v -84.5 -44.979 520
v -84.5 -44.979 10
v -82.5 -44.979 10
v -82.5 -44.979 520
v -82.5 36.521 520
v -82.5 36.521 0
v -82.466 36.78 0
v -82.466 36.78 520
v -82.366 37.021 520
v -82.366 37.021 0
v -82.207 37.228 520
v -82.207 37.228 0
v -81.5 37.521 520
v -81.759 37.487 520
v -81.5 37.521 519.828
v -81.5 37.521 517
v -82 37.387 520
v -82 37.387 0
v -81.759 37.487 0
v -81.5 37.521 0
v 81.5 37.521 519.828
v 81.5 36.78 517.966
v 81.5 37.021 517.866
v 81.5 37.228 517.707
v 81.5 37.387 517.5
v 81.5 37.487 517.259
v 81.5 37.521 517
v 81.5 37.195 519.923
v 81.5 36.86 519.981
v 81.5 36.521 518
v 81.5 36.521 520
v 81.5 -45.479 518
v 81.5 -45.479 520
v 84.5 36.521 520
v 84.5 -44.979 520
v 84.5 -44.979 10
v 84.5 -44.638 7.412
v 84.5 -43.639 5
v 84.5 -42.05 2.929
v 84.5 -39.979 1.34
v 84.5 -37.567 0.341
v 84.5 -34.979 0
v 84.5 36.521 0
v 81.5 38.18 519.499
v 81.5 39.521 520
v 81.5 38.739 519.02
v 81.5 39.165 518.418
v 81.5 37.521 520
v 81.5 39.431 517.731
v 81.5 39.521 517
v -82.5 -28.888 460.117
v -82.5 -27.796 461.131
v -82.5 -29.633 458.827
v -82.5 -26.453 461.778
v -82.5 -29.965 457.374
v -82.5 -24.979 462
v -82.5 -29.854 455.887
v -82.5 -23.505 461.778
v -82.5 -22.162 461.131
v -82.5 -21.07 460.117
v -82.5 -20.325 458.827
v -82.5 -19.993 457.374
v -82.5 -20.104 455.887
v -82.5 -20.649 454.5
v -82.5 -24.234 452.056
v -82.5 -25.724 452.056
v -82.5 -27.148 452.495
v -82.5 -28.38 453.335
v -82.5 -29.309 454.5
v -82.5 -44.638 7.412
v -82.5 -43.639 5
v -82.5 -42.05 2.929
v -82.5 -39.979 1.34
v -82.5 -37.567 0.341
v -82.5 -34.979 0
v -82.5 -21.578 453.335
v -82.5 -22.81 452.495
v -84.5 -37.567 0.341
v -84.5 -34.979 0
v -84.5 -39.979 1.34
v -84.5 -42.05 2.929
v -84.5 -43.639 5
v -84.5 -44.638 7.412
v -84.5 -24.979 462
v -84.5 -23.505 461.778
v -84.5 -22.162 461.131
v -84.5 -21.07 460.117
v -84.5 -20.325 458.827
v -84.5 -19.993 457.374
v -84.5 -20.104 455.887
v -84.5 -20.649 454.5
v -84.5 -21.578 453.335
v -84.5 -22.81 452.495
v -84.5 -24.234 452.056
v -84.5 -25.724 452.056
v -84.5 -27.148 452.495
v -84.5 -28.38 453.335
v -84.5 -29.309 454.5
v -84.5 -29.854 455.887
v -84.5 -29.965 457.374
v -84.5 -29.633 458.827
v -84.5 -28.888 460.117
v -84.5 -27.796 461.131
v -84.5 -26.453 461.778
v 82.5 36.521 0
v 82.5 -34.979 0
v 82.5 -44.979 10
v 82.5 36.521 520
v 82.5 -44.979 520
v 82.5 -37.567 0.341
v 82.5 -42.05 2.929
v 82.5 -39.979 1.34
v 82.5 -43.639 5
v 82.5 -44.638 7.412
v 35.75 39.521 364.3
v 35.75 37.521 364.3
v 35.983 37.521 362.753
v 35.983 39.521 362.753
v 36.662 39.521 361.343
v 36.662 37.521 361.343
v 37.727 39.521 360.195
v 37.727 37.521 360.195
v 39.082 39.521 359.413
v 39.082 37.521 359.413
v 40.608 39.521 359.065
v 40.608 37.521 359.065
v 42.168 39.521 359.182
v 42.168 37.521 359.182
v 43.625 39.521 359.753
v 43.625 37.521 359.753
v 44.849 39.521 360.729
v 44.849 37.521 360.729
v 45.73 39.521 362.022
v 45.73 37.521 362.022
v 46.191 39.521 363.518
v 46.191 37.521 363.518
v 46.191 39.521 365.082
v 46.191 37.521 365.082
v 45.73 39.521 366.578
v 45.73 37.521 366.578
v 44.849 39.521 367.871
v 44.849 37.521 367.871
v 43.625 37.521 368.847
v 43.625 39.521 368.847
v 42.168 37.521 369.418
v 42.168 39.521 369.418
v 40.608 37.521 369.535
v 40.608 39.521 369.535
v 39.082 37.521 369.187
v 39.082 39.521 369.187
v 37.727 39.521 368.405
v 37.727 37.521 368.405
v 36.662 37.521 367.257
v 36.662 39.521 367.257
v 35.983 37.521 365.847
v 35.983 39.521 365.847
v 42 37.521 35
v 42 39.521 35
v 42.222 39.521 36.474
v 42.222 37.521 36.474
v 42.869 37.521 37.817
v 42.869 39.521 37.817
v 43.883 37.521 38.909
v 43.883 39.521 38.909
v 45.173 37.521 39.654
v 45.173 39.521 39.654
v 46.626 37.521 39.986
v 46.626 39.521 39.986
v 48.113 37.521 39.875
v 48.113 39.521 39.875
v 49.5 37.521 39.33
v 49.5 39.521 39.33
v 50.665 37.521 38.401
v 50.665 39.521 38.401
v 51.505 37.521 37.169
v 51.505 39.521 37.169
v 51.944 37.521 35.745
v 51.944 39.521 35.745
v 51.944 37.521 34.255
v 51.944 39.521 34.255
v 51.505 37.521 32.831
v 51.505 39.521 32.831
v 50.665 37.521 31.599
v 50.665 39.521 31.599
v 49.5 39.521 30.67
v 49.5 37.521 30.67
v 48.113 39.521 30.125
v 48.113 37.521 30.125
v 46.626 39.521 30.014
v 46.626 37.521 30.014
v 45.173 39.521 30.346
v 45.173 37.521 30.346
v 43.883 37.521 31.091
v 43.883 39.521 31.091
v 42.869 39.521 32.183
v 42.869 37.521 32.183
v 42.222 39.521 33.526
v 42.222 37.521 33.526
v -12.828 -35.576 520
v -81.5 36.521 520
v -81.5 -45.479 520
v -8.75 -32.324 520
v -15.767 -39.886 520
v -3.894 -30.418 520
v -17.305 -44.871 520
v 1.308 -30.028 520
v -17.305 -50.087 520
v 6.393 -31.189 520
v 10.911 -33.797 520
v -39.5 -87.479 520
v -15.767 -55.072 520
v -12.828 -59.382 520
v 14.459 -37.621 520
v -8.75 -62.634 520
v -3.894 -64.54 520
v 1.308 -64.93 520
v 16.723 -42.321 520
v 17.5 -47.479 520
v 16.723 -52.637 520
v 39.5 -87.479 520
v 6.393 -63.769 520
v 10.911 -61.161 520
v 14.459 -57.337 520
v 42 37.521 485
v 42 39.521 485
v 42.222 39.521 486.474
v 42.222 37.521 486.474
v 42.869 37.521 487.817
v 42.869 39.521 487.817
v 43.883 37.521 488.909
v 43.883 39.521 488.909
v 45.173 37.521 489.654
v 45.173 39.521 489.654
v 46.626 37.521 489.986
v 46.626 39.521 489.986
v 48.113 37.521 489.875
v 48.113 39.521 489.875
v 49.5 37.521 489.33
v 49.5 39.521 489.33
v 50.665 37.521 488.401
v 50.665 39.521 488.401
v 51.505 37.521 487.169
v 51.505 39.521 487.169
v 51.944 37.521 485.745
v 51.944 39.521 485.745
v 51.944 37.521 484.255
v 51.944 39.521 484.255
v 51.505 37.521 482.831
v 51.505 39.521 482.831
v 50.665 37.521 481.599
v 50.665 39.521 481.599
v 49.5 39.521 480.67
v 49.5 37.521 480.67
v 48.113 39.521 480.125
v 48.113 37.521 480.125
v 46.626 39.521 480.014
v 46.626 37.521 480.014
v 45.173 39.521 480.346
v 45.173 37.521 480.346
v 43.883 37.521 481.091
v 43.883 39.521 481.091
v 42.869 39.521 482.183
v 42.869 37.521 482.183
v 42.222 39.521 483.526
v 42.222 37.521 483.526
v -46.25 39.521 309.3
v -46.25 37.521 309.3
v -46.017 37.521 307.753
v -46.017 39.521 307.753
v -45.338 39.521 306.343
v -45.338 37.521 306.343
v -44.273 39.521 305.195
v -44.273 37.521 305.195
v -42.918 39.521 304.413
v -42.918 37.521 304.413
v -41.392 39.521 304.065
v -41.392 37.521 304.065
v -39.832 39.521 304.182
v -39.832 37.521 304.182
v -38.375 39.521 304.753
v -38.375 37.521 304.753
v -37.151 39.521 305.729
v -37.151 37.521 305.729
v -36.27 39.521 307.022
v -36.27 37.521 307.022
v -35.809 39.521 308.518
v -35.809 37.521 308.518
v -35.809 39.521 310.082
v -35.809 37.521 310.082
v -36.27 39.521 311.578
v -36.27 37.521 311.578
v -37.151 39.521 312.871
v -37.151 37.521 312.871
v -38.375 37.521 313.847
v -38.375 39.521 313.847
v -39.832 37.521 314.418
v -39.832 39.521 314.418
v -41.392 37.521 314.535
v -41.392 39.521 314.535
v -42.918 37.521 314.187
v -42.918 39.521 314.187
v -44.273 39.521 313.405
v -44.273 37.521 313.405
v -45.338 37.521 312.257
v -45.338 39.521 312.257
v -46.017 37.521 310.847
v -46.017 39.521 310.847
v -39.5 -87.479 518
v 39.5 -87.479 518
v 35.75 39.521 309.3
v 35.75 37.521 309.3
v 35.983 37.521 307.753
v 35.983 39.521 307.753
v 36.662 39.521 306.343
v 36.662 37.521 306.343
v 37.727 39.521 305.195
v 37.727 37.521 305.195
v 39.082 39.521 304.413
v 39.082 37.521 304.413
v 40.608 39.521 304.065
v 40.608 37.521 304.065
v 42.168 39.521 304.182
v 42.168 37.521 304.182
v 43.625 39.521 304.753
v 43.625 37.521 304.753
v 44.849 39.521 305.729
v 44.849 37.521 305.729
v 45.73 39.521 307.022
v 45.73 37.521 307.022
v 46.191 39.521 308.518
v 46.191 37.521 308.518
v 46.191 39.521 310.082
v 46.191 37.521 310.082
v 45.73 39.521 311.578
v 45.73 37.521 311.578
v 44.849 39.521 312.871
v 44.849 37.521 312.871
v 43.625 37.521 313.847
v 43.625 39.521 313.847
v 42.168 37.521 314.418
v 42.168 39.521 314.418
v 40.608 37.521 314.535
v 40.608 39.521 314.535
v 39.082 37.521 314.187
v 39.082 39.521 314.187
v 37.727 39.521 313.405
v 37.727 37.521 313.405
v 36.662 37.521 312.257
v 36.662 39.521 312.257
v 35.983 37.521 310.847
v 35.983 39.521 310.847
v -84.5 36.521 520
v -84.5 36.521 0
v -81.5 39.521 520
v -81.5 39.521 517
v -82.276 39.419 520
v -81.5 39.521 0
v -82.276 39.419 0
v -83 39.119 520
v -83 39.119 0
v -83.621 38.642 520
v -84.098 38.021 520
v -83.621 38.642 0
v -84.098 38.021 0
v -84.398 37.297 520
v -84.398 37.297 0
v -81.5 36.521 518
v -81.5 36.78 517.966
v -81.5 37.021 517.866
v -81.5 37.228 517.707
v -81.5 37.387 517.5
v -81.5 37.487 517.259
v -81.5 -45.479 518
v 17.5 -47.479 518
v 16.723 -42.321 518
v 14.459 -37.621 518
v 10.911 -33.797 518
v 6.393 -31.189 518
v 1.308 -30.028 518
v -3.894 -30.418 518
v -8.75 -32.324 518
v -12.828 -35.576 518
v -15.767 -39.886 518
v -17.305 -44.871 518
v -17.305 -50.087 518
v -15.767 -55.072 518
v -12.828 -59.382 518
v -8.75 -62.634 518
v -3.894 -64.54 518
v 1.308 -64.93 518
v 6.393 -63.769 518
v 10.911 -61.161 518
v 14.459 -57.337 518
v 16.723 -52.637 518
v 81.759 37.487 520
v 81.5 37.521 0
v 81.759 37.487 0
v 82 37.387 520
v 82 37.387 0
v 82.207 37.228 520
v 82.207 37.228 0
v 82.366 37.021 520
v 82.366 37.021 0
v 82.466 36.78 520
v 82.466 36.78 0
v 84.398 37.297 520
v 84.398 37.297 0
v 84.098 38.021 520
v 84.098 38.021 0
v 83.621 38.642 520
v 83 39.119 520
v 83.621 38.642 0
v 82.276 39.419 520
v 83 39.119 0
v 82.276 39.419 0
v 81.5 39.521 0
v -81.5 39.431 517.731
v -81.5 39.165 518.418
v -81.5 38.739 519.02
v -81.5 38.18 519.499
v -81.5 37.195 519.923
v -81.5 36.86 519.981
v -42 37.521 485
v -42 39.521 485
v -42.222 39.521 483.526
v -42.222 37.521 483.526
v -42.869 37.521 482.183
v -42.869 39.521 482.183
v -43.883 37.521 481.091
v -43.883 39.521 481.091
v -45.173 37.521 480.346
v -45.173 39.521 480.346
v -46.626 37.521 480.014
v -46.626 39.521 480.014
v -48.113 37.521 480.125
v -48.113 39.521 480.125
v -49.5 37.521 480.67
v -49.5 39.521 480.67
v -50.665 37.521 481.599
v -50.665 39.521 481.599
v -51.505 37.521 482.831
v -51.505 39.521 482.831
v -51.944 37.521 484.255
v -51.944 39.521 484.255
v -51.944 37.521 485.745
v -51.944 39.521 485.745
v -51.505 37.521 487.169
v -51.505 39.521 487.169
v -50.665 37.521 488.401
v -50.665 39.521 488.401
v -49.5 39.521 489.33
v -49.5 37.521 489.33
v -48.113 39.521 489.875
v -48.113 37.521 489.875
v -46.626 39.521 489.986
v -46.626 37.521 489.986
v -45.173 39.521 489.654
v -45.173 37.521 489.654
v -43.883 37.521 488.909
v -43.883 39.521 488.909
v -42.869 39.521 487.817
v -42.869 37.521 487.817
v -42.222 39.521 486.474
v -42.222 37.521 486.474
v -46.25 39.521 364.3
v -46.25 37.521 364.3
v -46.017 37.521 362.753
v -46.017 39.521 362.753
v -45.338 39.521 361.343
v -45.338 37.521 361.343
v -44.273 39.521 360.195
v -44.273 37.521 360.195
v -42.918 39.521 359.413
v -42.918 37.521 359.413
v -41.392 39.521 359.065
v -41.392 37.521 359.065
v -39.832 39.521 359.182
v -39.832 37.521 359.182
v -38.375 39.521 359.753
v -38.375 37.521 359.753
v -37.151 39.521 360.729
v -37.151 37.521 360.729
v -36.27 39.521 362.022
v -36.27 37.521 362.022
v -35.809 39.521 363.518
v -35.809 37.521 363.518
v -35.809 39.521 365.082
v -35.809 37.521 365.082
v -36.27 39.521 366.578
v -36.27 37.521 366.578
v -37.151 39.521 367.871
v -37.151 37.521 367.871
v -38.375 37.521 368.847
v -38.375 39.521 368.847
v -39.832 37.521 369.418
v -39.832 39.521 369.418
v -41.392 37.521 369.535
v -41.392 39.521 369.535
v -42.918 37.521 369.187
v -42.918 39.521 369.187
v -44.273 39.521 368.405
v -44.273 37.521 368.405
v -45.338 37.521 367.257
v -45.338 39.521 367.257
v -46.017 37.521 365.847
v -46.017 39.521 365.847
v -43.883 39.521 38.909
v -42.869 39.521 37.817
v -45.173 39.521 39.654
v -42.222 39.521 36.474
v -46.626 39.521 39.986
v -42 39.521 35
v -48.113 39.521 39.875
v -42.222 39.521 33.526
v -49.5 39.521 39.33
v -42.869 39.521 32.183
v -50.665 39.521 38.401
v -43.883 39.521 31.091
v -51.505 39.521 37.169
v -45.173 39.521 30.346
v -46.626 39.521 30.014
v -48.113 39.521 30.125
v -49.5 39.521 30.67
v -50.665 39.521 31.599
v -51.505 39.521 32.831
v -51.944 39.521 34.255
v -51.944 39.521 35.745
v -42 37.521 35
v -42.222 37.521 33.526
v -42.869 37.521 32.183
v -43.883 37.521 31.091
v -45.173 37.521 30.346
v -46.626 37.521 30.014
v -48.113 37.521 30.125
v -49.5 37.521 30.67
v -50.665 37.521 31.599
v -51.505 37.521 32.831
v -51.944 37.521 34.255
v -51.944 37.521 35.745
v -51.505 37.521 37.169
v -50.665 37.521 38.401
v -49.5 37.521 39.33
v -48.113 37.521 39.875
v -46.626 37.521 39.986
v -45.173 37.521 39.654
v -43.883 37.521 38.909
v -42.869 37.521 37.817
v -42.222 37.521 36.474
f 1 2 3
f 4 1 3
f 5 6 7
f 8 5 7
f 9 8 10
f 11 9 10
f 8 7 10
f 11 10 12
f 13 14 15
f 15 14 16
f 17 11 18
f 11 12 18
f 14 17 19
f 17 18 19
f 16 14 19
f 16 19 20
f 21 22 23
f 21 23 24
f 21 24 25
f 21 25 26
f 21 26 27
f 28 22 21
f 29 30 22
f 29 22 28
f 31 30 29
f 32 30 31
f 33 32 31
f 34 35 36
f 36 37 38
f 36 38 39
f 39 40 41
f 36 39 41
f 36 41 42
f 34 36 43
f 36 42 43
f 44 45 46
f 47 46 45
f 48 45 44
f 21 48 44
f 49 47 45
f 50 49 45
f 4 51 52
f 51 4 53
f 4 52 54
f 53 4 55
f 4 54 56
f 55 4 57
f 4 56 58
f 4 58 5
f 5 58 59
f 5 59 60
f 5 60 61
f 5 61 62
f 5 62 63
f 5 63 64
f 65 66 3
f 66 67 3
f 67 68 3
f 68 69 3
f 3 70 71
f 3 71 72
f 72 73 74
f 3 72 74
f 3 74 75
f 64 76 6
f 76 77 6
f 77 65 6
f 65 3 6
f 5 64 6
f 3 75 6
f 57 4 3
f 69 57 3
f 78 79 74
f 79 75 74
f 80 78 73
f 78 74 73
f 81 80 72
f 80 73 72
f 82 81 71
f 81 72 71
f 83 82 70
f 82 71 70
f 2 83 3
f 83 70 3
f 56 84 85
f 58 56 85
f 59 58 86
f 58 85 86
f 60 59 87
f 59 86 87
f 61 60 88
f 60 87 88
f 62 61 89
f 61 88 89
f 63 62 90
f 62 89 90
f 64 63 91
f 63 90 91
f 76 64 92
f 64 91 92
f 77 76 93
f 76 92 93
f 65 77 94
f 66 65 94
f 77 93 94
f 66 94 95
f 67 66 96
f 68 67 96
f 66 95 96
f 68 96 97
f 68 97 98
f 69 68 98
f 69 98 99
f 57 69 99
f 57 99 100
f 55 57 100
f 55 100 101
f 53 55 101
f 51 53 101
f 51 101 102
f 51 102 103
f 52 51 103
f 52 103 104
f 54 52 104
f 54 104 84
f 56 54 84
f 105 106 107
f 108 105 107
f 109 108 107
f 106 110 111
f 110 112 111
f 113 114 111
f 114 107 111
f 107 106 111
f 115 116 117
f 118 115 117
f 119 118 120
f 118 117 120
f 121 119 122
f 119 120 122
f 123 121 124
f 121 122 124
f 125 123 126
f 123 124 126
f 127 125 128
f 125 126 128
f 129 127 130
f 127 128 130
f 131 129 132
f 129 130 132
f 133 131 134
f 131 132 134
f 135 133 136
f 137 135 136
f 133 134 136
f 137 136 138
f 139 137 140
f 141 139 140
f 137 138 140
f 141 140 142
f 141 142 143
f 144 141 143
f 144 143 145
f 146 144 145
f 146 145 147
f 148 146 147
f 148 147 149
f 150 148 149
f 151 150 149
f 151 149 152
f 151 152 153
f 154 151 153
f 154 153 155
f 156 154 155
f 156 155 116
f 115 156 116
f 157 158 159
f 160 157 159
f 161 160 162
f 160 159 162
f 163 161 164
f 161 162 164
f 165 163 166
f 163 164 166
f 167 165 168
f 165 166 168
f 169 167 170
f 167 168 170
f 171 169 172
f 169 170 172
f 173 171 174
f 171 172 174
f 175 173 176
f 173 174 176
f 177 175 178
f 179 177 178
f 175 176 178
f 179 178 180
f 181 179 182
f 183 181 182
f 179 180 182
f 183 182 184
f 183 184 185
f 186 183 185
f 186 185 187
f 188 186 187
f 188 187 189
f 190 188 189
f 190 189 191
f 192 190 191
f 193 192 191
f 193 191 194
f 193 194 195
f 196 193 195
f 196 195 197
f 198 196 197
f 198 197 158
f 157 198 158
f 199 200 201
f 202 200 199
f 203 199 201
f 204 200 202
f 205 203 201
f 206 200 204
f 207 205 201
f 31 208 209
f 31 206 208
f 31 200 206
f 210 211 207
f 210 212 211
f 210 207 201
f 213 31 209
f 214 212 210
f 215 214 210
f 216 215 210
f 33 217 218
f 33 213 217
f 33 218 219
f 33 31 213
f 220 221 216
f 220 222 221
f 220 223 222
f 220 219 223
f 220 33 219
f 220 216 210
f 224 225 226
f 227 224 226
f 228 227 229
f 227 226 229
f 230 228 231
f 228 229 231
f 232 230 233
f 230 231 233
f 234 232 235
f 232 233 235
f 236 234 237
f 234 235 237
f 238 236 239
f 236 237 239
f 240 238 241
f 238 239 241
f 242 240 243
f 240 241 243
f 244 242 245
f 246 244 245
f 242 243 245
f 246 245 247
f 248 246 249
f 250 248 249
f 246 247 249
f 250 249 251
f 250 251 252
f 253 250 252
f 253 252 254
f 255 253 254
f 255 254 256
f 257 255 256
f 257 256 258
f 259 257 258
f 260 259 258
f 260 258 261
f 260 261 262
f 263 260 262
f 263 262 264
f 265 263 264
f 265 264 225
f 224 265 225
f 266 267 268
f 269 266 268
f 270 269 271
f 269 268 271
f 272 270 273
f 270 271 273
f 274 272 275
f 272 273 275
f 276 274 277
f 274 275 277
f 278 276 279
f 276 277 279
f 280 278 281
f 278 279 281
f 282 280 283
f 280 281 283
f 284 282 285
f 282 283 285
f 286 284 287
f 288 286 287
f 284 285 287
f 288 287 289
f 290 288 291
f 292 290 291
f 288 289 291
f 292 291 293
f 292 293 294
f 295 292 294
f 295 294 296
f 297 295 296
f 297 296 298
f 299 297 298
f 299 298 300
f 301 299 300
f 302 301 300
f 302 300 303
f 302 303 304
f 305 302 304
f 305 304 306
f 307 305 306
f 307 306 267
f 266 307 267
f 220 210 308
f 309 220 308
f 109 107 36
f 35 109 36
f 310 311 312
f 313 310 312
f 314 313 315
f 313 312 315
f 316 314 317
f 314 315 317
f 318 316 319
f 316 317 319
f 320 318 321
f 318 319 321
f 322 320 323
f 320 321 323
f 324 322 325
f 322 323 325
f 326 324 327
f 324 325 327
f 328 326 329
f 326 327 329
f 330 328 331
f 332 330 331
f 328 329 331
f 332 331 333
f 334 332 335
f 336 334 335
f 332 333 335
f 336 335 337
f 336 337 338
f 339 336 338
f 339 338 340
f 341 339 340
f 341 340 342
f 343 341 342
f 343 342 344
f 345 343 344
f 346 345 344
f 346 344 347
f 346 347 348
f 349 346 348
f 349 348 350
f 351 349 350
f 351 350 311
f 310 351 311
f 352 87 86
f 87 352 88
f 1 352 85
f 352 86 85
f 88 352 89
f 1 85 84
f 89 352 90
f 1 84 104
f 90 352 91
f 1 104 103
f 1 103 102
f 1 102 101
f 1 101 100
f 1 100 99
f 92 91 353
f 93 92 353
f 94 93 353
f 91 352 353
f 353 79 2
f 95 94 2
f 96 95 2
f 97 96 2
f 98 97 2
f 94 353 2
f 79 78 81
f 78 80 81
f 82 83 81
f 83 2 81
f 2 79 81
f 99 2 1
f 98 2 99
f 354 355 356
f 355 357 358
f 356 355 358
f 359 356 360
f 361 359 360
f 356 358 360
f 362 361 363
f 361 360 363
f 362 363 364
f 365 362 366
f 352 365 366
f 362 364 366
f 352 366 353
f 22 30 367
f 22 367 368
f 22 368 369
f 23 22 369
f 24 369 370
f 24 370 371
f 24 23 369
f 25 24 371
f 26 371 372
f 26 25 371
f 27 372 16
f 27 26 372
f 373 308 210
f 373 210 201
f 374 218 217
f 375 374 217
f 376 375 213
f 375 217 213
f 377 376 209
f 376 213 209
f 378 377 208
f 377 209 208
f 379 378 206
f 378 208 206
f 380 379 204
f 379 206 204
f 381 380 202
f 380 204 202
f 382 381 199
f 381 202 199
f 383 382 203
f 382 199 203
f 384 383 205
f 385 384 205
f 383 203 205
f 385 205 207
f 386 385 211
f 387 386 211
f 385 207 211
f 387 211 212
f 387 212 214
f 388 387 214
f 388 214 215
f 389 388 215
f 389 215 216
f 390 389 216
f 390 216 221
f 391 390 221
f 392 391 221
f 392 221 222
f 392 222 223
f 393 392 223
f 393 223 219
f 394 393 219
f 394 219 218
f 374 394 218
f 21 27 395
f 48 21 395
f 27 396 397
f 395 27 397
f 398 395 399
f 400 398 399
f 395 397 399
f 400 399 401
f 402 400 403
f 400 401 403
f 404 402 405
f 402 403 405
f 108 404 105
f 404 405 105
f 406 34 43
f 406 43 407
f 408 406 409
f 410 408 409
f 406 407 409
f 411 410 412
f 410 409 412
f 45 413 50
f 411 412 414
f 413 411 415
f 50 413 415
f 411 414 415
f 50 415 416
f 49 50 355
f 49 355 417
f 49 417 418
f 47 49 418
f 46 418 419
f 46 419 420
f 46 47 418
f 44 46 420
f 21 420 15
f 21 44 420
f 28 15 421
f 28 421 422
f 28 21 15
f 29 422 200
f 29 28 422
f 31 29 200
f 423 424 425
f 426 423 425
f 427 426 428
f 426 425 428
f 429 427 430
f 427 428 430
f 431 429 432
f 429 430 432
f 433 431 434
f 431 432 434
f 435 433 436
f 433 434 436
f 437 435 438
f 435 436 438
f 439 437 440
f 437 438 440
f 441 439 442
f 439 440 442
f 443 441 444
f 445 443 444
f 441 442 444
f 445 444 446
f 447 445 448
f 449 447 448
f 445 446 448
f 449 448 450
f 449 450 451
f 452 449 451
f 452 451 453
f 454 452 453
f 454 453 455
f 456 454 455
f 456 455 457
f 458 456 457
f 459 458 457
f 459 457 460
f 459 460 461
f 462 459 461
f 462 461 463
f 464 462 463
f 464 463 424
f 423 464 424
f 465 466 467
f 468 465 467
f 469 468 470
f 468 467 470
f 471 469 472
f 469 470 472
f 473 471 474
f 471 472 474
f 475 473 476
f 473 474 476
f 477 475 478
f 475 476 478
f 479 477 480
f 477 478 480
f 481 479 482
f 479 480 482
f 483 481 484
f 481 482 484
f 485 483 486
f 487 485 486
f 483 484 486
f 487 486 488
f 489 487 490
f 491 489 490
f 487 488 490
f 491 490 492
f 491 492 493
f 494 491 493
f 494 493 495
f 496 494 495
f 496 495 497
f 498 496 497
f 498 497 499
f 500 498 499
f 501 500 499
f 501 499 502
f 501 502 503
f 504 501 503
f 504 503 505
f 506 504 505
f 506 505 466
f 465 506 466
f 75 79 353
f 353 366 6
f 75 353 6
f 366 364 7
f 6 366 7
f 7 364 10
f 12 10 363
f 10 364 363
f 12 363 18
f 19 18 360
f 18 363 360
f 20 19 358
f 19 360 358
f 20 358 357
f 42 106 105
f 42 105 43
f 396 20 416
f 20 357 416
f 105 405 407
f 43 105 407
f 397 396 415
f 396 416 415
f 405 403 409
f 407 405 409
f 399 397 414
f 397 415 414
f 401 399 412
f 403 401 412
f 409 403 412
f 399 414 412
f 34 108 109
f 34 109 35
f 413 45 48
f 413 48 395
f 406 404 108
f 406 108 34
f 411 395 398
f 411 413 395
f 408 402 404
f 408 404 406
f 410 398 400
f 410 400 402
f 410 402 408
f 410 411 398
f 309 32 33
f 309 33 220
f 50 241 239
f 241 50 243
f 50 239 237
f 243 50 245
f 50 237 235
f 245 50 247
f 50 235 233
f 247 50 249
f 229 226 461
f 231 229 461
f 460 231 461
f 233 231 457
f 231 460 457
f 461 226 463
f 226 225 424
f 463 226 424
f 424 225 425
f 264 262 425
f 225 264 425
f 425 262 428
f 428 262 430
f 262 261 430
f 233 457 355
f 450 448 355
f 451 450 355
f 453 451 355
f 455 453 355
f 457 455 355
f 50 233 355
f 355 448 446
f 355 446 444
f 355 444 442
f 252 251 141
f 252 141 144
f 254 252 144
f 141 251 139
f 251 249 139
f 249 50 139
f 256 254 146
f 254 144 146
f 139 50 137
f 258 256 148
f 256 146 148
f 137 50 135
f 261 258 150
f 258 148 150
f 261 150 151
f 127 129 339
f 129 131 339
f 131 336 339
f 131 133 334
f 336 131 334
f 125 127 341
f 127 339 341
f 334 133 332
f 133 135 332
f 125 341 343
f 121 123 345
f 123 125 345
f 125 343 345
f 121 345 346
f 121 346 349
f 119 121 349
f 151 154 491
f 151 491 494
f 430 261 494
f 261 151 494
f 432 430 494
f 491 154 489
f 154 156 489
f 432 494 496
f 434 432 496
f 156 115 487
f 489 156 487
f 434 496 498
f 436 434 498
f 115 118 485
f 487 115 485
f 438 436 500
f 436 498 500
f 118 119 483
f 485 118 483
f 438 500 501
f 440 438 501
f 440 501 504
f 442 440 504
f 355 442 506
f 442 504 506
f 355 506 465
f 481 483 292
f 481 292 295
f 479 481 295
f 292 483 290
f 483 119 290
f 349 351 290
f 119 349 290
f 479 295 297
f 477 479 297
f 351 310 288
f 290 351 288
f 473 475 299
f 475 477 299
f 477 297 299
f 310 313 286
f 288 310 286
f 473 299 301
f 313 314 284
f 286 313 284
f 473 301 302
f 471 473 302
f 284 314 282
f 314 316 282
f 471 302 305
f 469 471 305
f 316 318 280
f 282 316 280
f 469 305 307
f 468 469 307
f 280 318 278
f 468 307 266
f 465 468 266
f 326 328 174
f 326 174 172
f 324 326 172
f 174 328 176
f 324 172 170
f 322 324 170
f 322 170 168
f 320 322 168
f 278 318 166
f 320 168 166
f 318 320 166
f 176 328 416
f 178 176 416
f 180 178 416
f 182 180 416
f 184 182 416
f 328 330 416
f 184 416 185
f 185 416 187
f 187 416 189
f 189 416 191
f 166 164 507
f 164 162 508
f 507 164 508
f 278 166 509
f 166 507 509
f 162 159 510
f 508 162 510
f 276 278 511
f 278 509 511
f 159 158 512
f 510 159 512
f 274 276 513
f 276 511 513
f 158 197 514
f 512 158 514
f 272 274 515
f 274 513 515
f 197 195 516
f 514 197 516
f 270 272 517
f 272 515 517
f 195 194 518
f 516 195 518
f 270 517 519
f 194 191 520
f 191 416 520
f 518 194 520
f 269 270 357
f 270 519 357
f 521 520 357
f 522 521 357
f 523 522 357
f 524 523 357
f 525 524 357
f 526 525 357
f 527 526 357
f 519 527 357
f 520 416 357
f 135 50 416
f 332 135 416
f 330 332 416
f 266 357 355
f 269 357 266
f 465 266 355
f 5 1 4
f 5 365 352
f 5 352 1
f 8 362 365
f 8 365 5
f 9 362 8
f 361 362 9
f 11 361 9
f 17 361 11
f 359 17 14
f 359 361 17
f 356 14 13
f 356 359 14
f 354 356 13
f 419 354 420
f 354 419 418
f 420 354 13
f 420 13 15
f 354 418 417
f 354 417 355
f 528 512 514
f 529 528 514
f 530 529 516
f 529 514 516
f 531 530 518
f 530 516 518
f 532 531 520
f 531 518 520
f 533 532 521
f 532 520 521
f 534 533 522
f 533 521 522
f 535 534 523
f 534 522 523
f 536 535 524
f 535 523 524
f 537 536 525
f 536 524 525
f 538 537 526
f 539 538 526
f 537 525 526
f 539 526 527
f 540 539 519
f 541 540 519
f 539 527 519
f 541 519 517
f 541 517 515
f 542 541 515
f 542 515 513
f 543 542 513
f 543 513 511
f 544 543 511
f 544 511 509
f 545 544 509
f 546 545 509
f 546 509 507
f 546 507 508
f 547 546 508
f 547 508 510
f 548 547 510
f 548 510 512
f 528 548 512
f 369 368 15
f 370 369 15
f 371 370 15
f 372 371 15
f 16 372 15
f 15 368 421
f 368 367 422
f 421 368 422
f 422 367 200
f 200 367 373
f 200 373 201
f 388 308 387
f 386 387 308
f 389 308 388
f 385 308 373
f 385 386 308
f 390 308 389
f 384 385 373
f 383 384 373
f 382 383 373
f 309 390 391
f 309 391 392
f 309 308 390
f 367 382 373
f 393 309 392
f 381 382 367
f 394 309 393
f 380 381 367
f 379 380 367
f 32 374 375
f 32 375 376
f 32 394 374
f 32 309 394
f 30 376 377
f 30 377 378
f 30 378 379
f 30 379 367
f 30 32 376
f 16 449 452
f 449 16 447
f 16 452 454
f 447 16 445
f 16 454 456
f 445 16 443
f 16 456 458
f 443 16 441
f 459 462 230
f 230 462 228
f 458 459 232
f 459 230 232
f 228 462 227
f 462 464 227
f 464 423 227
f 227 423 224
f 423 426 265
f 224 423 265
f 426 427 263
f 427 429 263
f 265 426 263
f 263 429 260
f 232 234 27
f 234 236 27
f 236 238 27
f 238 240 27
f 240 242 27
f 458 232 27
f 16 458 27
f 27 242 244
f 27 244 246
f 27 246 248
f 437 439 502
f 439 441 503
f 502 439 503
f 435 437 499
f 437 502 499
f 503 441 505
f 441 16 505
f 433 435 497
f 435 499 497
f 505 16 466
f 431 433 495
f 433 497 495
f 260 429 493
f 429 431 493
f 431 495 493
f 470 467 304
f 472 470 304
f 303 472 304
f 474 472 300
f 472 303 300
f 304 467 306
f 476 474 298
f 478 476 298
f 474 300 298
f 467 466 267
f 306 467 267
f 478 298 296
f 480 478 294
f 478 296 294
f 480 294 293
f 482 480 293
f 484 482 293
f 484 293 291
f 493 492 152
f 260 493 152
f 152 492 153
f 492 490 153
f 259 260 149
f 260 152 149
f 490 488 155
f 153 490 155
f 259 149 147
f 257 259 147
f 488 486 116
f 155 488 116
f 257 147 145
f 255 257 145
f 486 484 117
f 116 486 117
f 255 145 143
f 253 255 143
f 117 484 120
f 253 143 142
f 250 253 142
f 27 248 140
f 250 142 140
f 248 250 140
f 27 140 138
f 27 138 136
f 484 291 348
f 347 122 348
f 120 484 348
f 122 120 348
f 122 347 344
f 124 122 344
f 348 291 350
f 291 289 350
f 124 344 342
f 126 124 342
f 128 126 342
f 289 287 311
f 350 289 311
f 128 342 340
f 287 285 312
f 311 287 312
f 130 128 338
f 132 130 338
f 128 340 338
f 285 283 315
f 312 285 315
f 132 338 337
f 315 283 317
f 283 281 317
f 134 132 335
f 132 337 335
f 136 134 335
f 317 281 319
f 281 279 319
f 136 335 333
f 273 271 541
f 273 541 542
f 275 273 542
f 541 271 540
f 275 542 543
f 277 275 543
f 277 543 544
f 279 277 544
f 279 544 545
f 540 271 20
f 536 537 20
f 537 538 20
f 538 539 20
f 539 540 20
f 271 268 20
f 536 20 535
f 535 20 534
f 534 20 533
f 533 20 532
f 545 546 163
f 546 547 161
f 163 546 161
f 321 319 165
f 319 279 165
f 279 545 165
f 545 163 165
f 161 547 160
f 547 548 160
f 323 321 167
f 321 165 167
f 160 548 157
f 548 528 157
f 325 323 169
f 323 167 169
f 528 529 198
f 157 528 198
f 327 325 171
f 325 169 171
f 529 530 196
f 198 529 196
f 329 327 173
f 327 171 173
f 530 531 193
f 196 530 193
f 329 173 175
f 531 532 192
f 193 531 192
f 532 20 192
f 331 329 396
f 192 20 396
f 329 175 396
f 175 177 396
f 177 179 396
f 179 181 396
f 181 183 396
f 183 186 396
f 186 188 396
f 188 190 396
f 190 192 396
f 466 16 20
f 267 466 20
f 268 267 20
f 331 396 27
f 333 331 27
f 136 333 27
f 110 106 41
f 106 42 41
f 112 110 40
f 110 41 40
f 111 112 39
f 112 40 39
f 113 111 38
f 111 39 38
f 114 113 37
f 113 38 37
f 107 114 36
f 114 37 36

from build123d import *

# Parameters (mm, degrees)
FLANGE_BASE1_DEPTH                 = 520
ESBO_O6_R                          = 5
CORTE_EXTRUS_O4_DEPTH              = 10
ARESTA_FLANGE1_STRIP_W             = 10
ARESTA_FLANGE1_STRIP_H             = 2
ARESTA_FLANGE1_STRIP_CUT_DEPTH     = 163
ARESTA_FLANGE1_DEPTH               = 163
QUEBRA_CANTO1_START                = 518
QUEBRA_CANTO1_DEPTH                = 2
ESBO_O10_R                         = 17.5
CORTE_EXTRUS_O5_DEPTH              = 10
FILETE1_R                          = 10
ESBO_O11_R                         = 5
CORTE_EXTRUS_O6_DEPTH              = 4
FURO_DE_DI_METRO_10_5_10_5_1_D     = 10.5
FURO_DE_DI_METRO_10_5_10_5_1_DEPTH = 11
FURO_DE_DI_METRO_10_5_10_5_1_TIP   = 3.15451825


# Read off the part's stored shape, not the designer's step: Quebra-Canto1
# Sheet-metal steps are written as plain solids
with BuildPart() as part:
    # Esboço1 → Flange-base1 (new body)
    with BuildSketch(Plane.XY):
        with BuildLine():
            Line((-82.5, -44.978989098), (-82.5, 36.521010902))
            ThreePointArc((-82.5, 36.521010902), (-82.207106781, 37.228117683), (-81.5, 37.521010902))
            Line((-81.5, 37.521010902), (81.5, 37.521010902))
            ThreePointArc((81.5, 37.521010902), (82.207106781, 37.228117683), (82.5, 36.521010902))
            Line((82.5, 36.521010902), (82.5, -44.978989098))
            Line((82.5, -44.978989098), (84.5, -44.978989098))
            Line((84.5, -44.978989098), (84.5, 36.521010902))
            ThreePointArc((84.5, 36.521010902), (83.621320344, 38.642331245), (81.5, 39.521010902))
            Line((81.5, 39.521010902), (-81.5, 39.521010902))
            ThreePointArc((-81.5, 39.521010902), (-83.621320344, 38.642331245), (-84.5, 36.521010902))
            Line((-84.5, 36.521010902), (-84.5, -44.978989098))
            Line((-84.5, -44.978989098), (-82.5, -44.978989098))
        make_face()
    extrude(amount=FLANGE_BASE1_DEPTH)

    # Esboço6 → Corte-extrusão4 (cut)
    with BuildSketch(Plane(origin=(0, 39.521010902, 0), x_dir=(1, 0, 0), z_dir=(0, 1, 0))):
        with Locations(Location((47, -485, 0), (0, 0, 180))):
            Circle(ESBO_O6_R)
        with Locations(Location((47, -35, 0), (0, 0, 180))):
            Circle(ESBO_O6_R)
        with Locations((-47, -485)):
            Circle(ESBO_O6_R)
        with Locations((-47, -35)):
            Circle(ESBO_O6_R)
    extrude(amount=-CORTE_EXTRUS_O4_DEPTH, mode=Mode.SUBTRACT)

    # Aresta-Flange1 strip (across the edge) → Aresta-Flange1 strip cut (cut)
    with BuildSketch(Plane(origin=(81.5, 37.521010902, 520), x_dir=(0, 0, -1), z_dir=(-1, 0, 0))):
        with Locations((-2, -1)):
            Rectangle(ARESTA_FLANGE1_STRIP_W, ARESTA_FLANGE1_STRIP_H)
    extrude(amount=ARESTA_FLANGE1_STRIP_CUT_DEPTH, mode=Mode.SUBTRACT)

    # Aresta-Flange1 section (across the edge) → Aresta-Flange1 (add)
    with BuildSketch(Plane(origin=(81.5, 37.521010902, 520), x_dir=(0, 0, -1), z_dir=(-1, 0, 0))):
        with BuildLine():
            Line((0, 1), (0, 125))
            Line((0, 125), (2, 125))
            Line((2, 125), (2, 1))
            ThreePointArc((2, 1), (2.292893219, 0.292893219), (3, 0))
            Line((3, 0), (3, -2))
            ThreePointArc((3, -2), (0.878679656, -1.121320344), (0, 1))
        make_face()
    extrude(amount=ARESTA_FLANGE1_DEPTH)

    # Quebra-Canto1 outline → Quebra-Canto1 (cut)
    with BuildSketch(Plane.XY.offset(QUEBRA_CANTO1_START)):
        Polygon((81.5, -87.478989098), (81.5, -45.478989098), (39.5, -87.478989098), align=None)
        Polygon((-81.5, -87.478989098), (-39.5, -87.478989098), (-81.5, -45.478989098), align=None)
    extrude(amount=QUEBRA_CANTO1_DEPTH, mode=Mode.SUBTRACT)

    # Esboço10 → Corte-extrusão5 (cut)
    with BuildSketch(Plane.XY.offset(520)):
        with Locations((0, -47.478989098)):
            Circle(ESBO_O10_R)
    extrude(amount=-CORTE_EXTRUS_O5_DEPTH, mode=Mode.SUBTRACT)

    # Filete1
    filete1_edges = [part.edges().sort_by_distance(p)[0] for p in [
        (83.5, -44.978989098, 0),
        (-83.5, -44.978989098, 0),
    ]]
    fillet(filete1_edges, radius=FILETE1_R)

    # Esboço11 → Corte-extrusão6 (cut)
    with BuildSketch(Plane.ZY.offset(84.5)):
        with Locations((457, -24.978989098)):
            Circle(ESBO_O11_R)
    extrude(amount=-CORTE_EXTRUS_O6_DEPTH, mode=Mode.SUBTRACT)

    # Furo de diâmetro Ø10.5 (10.5)1
    with Locations(Plane(origin=(-41, 39.521010902, 364.3), x_dir=(1, 0, 0), z_dir=(0, 1, 0))):
        with Locations((0, 0), (82, 0), (82, 55), (0, 55)):
            Hole(FURO_DE_DI_METRO_10_5_10_5_1_D / 2, depth=FURO_DE_DI_METRO_10_5_10_5_1_DEPTH)
            with Locations((0, 0, -(FURO_DE_DI_METRO_10_5_10_5_1_DEPTH + FURO_DE_DI_METRO_10_5_10_5_1_TIP / 2))):  # 118° drill point
                Cone(0, FURO_DE_DI_METRO_10_5_10_5_1_D / 2, FURO_DE_DI_METRO_10_5_10_5_1_TIP, mode=Mode.SUBTRACT)


solid = part.part
